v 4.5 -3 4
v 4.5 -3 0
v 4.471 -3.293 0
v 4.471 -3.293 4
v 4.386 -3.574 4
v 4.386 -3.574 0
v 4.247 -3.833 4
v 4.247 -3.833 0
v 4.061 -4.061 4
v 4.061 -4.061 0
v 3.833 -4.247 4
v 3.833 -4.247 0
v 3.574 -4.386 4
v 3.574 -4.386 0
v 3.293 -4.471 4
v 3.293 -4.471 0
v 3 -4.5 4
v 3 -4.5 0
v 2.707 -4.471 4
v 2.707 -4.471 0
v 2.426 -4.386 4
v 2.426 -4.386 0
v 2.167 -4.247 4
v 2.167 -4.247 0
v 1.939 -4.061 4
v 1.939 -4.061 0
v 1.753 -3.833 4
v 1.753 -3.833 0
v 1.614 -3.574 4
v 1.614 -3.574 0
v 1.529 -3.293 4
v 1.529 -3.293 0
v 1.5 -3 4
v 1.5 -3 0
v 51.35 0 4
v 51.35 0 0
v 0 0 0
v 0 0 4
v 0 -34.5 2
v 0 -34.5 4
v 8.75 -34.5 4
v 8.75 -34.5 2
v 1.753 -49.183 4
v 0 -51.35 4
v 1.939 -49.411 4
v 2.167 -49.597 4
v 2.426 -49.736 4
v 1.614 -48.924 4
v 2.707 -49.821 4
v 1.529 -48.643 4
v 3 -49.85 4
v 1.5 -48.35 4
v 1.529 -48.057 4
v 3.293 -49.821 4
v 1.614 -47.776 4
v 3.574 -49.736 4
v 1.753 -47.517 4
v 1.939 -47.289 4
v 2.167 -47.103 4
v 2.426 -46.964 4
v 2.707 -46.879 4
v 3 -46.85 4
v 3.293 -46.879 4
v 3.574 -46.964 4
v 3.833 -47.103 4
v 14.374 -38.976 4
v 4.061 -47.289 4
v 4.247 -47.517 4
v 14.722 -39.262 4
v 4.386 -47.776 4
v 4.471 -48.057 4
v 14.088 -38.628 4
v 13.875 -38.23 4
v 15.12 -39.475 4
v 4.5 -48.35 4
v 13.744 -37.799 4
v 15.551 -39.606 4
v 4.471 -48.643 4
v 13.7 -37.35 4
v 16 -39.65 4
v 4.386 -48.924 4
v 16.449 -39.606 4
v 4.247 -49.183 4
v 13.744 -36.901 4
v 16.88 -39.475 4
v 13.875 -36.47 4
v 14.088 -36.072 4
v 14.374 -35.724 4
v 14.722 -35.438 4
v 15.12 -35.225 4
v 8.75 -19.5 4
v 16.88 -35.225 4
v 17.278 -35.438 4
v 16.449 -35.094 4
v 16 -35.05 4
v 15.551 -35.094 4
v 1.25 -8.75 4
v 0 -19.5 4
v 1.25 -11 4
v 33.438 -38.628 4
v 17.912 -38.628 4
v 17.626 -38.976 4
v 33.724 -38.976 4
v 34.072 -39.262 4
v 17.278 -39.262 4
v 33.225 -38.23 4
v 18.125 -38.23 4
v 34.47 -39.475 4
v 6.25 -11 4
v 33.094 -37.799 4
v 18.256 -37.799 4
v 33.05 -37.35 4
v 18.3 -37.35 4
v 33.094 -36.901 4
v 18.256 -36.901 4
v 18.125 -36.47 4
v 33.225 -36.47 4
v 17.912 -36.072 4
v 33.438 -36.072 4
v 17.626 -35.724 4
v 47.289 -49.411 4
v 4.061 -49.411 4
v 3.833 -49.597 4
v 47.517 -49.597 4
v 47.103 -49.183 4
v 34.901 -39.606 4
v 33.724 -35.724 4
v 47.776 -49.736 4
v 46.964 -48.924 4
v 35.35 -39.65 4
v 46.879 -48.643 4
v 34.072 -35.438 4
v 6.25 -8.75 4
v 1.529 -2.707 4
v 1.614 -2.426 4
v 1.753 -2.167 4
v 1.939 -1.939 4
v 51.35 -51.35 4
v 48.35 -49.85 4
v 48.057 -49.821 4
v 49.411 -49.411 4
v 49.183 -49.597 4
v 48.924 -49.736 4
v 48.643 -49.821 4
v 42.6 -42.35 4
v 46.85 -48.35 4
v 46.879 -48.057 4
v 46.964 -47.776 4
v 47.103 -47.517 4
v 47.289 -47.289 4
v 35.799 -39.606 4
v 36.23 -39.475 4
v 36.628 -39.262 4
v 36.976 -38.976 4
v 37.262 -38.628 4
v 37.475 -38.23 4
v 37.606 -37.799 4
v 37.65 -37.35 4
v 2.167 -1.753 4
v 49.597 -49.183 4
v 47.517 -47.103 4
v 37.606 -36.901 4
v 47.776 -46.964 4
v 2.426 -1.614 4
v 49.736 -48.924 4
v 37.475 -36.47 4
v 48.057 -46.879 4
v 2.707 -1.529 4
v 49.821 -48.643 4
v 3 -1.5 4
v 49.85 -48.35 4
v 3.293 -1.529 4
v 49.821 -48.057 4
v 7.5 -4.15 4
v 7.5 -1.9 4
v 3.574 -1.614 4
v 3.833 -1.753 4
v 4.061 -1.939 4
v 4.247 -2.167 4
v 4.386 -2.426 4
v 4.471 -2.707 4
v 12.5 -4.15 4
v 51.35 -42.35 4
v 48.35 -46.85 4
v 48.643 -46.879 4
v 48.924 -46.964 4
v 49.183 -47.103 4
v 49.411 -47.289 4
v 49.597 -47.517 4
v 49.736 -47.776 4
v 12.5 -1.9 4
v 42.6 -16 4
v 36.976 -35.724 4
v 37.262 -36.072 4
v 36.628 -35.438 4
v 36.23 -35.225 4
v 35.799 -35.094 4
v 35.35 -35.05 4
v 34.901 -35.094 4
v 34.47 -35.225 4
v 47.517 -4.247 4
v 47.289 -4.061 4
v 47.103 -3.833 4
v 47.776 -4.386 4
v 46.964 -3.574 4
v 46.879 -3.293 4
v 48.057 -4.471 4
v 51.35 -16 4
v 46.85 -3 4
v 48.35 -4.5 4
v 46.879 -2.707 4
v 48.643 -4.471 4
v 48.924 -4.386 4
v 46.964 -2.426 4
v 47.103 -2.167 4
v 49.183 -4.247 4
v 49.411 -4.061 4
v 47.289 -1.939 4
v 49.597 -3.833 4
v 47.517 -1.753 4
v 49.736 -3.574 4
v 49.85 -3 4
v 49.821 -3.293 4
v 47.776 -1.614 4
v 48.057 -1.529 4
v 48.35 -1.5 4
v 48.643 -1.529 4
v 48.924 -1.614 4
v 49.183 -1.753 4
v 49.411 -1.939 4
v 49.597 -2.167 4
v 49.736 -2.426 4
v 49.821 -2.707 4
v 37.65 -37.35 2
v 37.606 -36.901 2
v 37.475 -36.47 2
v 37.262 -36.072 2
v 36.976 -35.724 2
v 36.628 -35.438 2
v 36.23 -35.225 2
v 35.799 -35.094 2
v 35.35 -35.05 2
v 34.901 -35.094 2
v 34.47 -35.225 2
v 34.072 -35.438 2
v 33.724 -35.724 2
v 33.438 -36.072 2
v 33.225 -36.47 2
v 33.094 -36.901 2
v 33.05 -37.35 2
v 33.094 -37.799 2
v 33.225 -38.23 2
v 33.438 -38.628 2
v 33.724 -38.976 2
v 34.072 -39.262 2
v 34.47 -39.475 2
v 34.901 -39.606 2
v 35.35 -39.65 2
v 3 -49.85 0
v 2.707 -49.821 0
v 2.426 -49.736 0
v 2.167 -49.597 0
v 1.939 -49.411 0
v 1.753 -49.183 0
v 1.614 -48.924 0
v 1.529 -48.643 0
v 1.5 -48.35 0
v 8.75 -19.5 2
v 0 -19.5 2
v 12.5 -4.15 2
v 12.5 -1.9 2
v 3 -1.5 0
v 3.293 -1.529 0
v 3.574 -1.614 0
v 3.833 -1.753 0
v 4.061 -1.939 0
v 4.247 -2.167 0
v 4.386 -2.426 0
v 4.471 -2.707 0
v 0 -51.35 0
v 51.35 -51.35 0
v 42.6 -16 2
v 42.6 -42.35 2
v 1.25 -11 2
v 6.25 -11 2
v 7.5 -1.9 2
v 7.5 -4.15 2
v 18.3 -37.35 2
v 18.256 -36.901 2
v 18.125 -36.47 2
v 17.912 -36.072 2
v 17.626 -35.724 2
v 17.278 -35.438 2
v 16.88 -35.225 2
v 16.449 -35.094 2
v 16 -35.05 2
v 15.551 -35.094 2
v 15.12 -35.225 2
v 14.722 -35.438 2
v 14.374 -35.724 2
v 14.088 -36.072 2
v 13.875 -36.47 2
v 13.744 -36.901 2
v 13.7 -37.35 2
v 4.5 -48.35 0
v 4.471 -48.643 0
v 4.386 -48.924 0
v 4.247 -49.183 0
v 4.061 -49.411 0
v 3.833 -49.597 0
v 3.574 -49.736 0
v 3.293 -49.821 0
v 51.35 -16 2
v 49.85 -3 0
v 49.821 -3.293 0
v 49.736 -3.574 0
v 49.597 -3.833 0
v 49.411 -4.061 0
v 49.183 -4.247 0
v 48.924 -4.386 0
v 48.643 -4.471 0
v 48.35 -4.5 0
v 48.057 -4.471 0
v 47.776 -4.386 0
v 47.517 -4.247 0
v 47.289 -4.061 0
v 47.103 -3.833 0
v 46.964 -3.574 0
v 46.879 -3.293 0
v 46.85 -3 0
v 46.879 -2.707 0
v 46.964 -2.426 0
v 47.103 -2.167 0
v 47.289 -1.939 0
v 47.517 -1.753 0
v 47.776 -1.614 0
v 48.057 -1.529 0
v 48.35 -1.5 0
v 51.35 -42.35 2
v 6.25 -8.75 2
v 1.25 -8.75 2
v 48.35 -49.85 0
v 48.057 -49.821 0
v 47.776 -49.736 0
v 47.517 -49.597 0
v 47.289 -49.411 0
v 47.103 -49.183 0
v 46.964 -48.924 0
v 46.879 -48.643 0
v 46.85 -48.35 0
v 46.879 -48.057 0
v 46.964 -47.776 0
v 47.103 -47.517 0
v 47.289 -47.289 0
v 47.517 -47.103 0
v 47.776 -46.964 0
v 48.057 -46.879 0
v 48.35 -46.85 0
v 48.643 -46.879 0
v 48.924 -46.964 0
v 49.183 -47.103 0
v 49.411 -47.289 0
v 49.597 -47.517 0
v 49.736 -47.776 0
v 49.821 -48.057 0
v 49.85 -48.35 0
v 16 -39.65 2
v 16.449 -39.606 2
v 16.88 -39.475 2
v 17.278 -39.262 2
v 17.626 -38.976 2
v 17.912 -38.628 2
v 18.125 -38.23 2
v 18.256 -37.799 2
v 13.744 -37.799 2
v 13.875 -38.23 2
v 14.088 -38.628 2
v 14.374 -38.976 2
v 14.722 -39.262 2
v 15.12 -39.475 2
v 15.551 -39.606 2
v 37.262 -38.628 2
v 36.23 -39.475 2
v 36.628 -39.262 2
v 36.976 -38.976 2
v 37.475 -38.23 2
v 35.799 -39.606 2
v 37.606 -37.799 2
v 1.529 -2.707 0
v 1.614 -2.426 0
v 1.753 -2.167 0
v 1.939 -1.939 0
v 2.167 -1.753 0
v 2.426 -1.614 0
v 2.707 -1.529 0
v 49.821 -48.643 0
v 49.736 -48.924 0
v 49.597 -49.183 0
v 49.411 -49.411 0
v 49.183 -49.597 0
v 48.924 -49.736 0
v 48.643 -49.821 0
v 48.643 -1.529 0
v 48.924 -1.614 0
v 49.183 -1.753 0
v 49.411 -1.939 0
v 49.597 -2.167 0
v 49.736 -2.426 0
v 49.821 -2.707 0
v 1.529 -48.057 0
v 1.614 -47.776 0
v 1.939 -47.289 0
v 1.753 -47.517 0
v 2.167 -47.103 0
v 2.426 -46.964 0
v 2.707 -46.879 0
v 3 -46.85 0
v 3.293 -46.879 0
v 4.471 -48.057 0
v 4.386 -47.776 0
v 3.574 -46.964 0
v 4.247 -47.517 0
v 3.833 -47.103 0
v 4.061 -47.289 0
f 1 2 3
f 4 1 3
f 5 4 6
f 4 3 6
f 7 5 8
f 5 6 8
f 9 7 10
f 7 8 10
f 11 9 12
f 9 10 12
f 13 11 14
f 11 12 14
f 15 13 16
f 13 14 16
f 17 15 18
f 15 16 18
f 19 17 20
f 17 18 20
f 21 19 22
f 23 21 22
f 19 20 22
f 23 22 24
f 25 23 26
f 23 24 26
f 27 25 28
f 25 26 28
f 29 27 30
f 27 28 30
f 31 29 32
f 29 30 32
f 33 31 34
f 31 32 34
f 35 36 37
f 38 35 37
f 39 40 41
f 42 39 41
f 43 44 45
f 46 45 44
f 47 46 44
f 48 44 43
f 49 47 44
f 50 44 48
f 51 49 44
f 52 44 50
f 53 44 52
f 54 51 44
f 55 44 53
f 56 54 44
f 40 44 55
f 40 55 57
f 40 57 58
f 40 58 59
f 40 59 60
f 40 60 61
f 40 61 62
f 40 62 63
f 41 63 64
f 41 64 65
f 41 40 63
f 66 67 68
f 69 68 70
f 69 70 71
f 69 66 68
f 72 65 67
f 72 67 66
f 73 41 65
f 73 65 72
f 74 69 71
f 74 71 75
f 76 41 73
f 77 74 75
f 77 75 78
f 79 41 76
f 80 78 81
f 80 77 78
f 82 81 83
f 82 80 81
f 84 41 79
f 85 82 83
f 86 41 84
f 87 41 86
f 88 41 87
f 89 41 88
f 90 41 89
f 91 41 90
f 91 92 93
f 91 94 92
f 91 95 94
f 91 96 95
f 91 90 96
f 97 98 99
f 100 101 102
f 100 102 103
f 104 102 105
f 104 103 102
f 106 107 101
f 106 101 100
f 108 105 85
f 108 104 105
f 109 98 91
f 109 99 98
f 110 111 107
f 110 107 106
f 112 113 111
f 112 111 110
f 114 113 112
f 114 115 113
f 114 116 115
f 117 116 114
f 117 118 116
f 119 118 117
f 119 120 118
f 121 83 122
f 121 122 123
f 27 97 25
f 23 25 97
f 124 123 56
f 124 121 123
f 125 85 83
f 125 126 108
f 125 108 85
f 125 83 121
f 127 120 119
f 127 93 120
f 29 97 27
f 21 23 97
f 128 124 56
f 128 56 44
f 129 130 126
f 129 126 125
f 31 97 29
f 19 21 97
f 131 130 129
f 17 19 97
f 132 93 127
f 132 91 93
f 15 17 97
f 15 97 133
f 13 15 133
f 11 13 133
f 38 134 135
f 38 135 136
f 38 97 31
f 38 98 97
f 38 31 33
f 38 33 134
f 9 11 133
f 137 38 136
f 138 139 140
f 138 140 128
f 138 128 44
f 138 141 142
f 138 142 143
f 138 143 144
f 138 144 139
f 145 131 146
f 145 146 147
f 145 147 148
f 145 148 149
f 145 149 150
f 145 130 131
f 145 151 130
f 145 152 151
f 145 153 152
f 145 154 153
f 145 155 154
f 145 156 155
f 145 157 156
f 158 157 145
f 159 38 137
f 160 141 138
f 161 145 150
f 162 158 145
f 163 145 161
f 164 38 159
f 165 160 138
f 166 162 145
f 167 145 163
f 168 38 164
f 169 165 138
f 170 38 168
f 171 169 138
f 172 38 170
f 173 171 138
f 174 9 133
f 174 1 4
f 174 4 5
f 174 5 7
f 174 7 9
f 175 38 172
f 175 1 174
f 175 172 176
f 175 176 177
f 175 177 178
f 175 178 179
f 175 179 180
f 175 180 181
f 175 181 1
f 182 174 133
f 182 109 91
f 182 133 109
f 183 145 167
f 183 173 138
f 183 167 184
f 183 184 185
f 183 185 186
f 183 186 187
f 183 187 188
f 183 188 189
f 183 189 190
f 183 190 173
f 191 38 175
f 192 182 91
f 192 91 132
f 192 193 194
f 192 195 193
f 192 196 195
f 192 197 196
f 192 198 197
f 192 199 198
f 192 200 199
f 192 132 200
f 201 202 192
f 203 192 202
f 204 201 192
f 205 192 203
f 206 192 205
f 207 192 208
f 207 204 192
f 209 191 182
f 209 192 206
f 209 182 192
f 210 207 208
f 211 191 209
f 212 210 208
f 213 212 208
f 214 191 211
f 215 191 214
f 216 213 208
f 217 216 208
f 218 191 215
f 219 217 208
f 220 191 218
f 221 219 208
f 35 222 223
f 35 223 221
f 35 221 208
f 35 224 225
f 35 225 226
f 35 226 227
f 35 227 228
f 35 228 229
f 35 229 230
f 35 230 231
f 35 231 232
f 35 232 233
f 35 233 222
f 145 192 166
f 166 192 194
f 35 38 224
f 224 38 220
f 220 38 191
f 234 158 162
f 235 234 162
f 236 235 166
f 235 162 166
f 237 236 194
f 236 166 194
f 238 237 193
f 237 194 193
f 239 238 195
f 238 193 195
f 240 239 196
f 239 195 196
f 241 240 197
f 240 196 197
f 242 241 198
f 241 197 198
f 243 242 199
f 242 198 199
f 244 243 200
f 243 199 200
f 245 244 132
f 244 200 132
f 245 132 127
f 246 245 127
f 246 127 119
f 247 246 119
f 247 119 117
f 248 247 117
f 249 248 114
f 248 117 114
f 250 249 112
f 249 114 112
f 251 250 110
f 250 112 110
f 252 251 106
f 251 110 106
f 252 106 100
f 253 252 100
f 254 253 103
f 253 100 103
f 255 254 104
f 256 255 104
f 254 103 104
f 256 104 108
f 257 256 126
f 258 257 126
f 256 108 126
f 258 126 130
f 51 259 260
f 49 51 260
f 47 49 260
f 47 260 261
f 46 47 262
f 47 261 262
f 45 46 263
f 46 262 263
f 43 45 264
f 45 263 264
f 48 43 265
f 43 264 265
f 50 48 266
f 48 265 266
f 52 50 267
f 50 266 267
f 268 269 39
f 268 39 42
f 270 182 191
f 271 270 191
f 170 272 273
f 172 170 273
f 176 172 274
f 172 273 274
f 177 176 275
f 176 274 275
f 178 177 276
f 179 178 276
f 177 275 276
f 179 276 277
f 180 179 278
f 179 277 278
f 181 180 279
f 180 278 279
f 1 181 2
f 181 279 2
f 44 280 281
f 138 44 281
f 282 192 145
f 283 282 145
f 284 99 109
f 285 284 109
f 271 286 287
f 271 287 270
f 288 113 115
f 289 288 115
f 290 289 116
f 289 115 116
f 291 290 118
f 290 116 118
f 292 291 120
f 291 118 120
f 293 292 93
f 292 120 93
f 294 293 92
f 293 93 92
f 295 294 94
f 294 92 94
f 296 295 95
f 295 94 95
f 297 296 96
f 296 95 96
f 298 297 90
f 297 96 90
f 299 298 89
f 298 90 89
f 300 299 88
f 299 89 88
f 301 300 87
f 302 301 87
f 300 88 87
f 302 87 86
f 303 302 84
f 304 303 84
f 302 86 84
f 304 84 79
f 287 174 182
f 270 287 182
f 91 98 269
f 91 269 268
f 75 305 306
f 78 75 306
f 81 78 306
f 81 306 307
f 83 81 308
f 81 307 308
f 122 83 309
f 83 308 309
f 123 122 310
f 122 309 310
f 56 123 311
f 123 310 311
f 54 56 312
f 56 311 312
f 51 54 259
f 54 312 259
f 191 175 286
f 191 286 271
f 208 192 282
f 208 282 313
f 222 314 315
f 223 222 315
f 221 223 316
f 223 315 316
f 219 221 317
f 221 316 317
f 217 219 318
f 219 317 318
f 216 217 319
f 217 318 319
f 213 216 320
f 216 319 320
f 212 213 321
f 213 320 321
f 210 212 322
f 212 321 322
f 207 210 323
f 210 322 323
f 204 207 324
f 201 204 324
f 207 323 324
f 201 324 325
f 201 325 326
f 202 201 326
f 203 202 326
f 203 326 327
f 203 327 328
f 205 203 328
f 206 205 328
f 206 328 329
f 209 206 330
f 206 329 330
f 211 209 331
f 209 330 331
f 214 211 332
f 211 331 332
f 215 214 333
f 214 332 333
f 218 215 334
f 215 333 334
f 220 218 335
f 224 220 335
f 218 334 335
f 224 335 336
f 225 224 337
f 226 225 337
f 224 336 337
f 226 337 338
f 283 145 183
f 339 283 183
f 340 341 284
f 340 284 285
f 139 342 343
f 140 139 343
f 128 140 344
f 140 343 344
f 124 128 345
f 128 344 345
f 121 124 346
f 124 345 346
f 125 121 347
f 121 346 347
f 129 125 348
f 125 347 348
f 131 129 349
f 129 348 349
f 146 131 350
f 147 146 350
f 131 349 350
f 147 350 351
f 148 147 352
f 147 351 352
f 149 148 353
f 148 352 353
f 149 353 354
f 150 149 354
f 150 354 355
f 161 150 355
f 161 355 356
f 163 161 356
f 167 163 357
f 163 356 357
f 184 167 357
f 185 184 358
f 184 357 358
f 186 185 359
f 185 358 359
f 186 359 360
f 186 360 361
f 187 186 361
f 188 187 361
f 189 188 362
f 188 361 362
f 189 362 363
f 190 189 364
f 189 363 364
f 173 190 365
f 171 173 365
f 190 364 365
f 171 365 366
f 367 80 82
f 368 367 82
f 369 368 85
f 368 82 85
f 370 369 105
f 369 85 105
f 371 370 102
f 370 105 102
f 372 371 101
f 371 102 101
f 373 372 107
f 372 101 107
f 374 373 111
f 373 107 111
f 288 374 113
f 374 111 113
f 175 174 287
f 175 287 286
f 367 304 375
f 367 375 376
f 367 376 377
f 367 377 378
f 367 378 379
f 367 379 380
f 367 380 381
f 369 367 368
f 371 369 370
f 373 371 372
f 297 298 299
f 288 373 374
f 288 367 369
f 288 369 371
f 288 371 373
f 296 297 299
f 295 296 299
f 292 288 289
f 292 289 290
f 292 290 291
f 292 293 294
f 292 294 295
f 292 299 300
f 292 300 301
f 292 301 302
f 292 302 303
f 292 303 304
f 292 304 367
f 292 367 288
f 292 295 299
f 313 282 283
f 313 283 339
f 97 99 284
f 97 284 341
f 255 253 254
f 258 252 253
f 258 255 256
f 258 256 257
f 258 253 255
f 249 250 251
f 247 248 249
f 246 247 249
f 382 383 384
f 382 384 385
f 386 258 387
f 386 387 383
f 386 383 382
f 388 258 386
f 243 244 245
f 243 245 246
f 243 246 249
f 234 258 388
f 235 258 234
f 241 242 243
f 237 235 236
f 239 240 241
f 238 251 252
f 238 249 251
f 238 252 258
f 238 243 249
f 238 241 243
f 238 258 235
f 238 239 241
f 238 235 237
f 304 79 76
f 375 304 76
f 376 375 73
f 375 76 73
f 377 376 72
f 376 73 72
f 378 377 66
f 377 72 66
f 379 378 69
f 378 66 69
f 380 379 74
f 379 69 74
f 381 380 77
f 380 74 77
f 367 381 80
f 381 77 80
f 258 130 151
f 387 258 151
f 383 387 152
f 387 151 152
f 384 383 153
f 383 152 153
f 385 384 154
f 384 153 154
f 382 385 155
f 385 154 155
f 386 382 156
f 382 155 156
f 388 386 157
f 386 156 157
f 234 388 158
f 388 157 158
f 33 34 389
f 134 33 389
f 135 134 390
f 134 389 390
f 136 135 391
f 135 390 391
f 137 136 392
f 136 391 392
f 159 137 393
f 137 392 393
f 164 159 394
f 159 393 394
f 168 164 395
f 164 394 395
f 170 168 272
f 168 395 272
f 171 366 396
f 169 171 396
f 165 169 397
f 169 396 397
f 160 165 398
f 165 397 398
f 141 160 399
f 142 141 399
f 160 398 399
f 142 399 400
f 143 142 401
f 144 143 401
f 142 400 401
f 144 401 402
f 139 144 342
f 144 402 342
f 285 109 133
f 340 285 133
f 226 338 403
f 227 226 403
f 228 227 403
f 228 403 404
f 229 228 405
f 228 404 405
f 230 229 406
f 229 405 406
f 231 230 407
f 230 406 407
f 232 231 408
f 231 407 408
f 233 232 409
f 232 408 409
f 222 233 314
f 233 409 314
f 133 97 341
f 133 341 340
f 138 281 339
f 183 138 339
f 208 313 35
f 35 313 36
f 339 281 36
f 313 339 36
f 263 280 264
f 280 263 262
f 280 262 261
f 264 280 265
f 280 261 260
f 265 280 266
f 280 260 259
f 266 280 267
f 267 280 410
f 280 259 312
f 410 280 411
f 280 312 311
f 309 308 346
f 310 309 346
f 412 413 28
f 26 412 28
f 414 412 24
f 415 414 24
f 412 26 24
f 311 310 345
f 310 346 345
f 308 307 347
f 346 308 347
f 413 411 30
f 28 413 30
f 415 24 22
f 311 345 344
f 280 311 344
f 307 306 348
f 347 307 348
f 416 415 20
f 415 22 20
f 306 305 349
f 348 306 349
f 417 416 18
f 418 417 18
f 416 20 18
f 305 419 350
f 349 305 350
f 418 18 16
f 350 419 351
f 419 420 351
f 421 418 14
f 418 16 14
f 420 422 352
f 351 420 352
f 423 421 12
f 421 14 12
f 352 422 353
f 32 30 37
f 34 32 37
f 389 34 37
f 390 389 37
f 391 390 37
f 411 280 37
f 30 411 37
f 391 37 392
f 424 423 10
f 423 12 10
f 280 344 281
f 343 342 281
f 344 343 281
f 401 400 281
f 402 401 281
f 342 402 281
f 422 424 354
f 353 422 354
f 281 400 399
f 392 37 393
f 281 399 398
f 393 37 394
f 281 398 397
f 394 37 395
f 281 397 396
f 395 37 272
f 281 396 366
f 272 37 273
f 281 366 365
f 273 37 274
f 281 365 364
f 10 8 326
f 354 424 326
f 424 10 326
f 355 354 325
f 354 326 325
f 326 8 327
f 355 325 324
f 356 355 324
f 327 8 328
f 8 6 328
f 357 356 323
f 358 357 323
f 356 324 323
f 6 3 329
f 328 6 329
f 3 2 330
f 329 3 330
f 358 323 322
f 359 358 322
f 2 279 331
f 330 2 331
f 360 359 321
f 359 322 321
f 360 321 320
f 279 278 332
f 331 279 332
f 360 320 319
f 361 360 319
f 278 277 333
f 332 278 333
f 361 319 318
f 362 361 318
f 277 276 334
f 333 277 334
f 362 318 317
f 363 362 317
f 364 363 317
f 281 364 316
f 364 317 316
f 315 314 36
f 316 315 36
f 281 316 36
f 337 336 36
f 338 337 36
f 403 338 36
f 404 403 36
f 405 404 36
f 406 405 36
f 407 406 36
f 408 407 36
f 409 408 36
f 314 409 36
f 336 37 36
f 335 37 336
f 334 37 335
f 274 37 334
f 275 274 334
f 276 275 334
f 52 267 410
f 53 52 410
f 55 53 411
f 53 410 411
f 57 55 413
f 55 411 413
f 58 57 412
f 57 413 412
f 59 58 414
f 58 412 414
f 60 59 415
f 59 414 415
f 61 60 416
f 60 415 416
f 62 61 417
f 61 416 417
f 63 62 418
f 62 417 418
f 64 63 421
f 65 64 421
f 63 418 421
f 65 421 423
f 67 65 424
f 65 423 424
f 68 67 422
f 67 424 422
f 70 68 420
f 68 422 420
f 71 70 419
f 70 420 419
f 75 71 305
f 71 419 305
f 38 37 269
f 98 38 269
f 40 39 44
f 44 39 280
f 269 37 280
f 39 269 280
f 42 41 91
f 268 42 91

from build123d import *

# Parameters (mm, degrees)
F1_DEPTH = 4
F2_W     = 5
F2_H     = 2.25
F2_W_2   = 8.75
F2_H_2   = 15
F2_H_3   = 21.35
F2_H_4   = 5
F3_DEPTH = 2


with BuildPart() as f1:
    # F0 (on Top) → F1 (new body)
    with BuildSketch(Plane.XY):
        with BuildLine():
            Line((48.35, 0), (3, 0))
            Line((3, 0), (3, -1.5))
            ThreePointArc((3, -1.5), (4.06066, -1.93934), (4.5, -3))
            ThreePointArc((4.5, -3), (3, -4.5), (1.5, -3))
            Line((1.5, -3), (0, -3))
            Line((0, -3), (0, -48.35))
            Line((0, -48.35), (1.5, -48.35))
            ThreePointArc((1.5, -48.35), (3, -46.85), (4.5, -48.35))
            ThreePointArc((4.5, -48.35), (4.06066, -49.41066), (3, -49.85))
            Line((3, -49.85), (3, -51.35))
            Line((3, -51.35), (48.35, -51.35))
            Line((48.35, -51.35), (48.35, -49.85))
            ThreePointArc((48.35, -49.85), (47.28934, -47.28934), (49.85, -48.35))
            Line((49.85, -48.35), (51.35, -48.35))
            Line((51.35, -48.35), (51.35, -3))
            Line((51.35, -3), (49.85, -3))
            ThreePointArc((49.85, -3), (47.28934, -4.06066), (48.35, -1.5))
            Line((48.35, -1.5), (48.35, 0))
        make_face()
        with BuildLine():
            Line((1.5, -48.35), (0, -48.35))
            Line((0, -48.35), (0, -51.35))
            Line((0, -51.35), (3, -51.35))
            Line((3, -51.35), (3, -49.85))
            ThreePointArc((3, -49.85), (1.93934, -49.41066), (1.5, -48.35))
        make_face()
        with BuildLine():
            Line((51.35, -51.35), (51.35, -48.35))
            Line((51.35, -48.35), (49.85, -48.35))
            ThreePointArc((49.85, -48.35), (49.41066, -49.41066), (48.35, -49.85))
            Line((48.35, -49.85), (48.35, -51.35))
            Line((48.35, -51.35), (51.35, -51.35))
        make_face()
        with BuildLine():
            Line((51.35, 0), (48.35, 0))
            Line((48.35, 0), (48.35, -1.5))
            ThreePointArc((48.35, -1.5), (49.41066, -1.93934), (49.85, -3))
            Line((49.85, -3), (51.35, -3))
            Line((51.35, -3), (51.35, 0))
        make_face()
        with BuildLine():
            Line((3, 0), (0, 0))
            Line((0, 0), (0, -3))
            Line((0, -3), (1.5, -3))
            ThreePointArc((1.5, -3), (1.93934, -1.93934), (3, -1.5))
            Line((3, -1.5), (3, 0))
        make_face()
    extrude(amount=F1_DEPTH)

    # F2 (on face) → F3 (cut)
    with BuildSketch(Plane.XY.offset(4)):
        with Locations((3.75, -9.875)):
            Rectangle(F2_W, F2_H)
        with Locations((4.375, -27)):
            Rectangle(F2_W_2, F2_H_2)
        with BuildLine():
            Line((16, -37.35), (13.7, -37.35))
            ThreePointArc((13.7, -37.35), (14.373654, -38.976346), (16, -39.65))
            Line((16, -39.65), (16, -37.35))
        make_face()
        with BuildLine():
            ThreePointArc((18.3, -37.35), (16, -35.05), (13.7, -37.35))
            Line((13.7, -37.35), (16, -37.35))
            Line((16, -37.35), (16, -39.65))
            ThreePointArc((16, -39.65), (17.626346, -38.976346), (18.3, -37.35))
        make_face()
        with BuildLine():
            ThreePointArc((37.65, -37.35), (33.723654, -35.723654), (35.35, -39.65))
            Line((35.35, -39.65), (35.35, -37.35))
            Line((35.35, -37.35), (37.65, -37.35))
        make_face()
        with BuildLine():
            Line((35.35, -37.35), (35.35, -39.65))
            ThreePointArc((35.35, -39.65), (36.976346, -38.976346), (37.65, -37.35))
            Line((37.65, -37.35), (35.35, -37.35))
        make_face()
        with Locations((46.975, -26.675)):
            Rectangle(F2_W_2, F2_H_3)
        with Locations((46.975, -39.85)):
            Rectangle(F2_W_2, F2_H_4)
        with Locations((10, -3.025)):
            Rectangle(F2_W, F2_H)
    extrude(amount=-F3_DEPTH, mode=Mode.SUBTRACT)


solid = f1.part
